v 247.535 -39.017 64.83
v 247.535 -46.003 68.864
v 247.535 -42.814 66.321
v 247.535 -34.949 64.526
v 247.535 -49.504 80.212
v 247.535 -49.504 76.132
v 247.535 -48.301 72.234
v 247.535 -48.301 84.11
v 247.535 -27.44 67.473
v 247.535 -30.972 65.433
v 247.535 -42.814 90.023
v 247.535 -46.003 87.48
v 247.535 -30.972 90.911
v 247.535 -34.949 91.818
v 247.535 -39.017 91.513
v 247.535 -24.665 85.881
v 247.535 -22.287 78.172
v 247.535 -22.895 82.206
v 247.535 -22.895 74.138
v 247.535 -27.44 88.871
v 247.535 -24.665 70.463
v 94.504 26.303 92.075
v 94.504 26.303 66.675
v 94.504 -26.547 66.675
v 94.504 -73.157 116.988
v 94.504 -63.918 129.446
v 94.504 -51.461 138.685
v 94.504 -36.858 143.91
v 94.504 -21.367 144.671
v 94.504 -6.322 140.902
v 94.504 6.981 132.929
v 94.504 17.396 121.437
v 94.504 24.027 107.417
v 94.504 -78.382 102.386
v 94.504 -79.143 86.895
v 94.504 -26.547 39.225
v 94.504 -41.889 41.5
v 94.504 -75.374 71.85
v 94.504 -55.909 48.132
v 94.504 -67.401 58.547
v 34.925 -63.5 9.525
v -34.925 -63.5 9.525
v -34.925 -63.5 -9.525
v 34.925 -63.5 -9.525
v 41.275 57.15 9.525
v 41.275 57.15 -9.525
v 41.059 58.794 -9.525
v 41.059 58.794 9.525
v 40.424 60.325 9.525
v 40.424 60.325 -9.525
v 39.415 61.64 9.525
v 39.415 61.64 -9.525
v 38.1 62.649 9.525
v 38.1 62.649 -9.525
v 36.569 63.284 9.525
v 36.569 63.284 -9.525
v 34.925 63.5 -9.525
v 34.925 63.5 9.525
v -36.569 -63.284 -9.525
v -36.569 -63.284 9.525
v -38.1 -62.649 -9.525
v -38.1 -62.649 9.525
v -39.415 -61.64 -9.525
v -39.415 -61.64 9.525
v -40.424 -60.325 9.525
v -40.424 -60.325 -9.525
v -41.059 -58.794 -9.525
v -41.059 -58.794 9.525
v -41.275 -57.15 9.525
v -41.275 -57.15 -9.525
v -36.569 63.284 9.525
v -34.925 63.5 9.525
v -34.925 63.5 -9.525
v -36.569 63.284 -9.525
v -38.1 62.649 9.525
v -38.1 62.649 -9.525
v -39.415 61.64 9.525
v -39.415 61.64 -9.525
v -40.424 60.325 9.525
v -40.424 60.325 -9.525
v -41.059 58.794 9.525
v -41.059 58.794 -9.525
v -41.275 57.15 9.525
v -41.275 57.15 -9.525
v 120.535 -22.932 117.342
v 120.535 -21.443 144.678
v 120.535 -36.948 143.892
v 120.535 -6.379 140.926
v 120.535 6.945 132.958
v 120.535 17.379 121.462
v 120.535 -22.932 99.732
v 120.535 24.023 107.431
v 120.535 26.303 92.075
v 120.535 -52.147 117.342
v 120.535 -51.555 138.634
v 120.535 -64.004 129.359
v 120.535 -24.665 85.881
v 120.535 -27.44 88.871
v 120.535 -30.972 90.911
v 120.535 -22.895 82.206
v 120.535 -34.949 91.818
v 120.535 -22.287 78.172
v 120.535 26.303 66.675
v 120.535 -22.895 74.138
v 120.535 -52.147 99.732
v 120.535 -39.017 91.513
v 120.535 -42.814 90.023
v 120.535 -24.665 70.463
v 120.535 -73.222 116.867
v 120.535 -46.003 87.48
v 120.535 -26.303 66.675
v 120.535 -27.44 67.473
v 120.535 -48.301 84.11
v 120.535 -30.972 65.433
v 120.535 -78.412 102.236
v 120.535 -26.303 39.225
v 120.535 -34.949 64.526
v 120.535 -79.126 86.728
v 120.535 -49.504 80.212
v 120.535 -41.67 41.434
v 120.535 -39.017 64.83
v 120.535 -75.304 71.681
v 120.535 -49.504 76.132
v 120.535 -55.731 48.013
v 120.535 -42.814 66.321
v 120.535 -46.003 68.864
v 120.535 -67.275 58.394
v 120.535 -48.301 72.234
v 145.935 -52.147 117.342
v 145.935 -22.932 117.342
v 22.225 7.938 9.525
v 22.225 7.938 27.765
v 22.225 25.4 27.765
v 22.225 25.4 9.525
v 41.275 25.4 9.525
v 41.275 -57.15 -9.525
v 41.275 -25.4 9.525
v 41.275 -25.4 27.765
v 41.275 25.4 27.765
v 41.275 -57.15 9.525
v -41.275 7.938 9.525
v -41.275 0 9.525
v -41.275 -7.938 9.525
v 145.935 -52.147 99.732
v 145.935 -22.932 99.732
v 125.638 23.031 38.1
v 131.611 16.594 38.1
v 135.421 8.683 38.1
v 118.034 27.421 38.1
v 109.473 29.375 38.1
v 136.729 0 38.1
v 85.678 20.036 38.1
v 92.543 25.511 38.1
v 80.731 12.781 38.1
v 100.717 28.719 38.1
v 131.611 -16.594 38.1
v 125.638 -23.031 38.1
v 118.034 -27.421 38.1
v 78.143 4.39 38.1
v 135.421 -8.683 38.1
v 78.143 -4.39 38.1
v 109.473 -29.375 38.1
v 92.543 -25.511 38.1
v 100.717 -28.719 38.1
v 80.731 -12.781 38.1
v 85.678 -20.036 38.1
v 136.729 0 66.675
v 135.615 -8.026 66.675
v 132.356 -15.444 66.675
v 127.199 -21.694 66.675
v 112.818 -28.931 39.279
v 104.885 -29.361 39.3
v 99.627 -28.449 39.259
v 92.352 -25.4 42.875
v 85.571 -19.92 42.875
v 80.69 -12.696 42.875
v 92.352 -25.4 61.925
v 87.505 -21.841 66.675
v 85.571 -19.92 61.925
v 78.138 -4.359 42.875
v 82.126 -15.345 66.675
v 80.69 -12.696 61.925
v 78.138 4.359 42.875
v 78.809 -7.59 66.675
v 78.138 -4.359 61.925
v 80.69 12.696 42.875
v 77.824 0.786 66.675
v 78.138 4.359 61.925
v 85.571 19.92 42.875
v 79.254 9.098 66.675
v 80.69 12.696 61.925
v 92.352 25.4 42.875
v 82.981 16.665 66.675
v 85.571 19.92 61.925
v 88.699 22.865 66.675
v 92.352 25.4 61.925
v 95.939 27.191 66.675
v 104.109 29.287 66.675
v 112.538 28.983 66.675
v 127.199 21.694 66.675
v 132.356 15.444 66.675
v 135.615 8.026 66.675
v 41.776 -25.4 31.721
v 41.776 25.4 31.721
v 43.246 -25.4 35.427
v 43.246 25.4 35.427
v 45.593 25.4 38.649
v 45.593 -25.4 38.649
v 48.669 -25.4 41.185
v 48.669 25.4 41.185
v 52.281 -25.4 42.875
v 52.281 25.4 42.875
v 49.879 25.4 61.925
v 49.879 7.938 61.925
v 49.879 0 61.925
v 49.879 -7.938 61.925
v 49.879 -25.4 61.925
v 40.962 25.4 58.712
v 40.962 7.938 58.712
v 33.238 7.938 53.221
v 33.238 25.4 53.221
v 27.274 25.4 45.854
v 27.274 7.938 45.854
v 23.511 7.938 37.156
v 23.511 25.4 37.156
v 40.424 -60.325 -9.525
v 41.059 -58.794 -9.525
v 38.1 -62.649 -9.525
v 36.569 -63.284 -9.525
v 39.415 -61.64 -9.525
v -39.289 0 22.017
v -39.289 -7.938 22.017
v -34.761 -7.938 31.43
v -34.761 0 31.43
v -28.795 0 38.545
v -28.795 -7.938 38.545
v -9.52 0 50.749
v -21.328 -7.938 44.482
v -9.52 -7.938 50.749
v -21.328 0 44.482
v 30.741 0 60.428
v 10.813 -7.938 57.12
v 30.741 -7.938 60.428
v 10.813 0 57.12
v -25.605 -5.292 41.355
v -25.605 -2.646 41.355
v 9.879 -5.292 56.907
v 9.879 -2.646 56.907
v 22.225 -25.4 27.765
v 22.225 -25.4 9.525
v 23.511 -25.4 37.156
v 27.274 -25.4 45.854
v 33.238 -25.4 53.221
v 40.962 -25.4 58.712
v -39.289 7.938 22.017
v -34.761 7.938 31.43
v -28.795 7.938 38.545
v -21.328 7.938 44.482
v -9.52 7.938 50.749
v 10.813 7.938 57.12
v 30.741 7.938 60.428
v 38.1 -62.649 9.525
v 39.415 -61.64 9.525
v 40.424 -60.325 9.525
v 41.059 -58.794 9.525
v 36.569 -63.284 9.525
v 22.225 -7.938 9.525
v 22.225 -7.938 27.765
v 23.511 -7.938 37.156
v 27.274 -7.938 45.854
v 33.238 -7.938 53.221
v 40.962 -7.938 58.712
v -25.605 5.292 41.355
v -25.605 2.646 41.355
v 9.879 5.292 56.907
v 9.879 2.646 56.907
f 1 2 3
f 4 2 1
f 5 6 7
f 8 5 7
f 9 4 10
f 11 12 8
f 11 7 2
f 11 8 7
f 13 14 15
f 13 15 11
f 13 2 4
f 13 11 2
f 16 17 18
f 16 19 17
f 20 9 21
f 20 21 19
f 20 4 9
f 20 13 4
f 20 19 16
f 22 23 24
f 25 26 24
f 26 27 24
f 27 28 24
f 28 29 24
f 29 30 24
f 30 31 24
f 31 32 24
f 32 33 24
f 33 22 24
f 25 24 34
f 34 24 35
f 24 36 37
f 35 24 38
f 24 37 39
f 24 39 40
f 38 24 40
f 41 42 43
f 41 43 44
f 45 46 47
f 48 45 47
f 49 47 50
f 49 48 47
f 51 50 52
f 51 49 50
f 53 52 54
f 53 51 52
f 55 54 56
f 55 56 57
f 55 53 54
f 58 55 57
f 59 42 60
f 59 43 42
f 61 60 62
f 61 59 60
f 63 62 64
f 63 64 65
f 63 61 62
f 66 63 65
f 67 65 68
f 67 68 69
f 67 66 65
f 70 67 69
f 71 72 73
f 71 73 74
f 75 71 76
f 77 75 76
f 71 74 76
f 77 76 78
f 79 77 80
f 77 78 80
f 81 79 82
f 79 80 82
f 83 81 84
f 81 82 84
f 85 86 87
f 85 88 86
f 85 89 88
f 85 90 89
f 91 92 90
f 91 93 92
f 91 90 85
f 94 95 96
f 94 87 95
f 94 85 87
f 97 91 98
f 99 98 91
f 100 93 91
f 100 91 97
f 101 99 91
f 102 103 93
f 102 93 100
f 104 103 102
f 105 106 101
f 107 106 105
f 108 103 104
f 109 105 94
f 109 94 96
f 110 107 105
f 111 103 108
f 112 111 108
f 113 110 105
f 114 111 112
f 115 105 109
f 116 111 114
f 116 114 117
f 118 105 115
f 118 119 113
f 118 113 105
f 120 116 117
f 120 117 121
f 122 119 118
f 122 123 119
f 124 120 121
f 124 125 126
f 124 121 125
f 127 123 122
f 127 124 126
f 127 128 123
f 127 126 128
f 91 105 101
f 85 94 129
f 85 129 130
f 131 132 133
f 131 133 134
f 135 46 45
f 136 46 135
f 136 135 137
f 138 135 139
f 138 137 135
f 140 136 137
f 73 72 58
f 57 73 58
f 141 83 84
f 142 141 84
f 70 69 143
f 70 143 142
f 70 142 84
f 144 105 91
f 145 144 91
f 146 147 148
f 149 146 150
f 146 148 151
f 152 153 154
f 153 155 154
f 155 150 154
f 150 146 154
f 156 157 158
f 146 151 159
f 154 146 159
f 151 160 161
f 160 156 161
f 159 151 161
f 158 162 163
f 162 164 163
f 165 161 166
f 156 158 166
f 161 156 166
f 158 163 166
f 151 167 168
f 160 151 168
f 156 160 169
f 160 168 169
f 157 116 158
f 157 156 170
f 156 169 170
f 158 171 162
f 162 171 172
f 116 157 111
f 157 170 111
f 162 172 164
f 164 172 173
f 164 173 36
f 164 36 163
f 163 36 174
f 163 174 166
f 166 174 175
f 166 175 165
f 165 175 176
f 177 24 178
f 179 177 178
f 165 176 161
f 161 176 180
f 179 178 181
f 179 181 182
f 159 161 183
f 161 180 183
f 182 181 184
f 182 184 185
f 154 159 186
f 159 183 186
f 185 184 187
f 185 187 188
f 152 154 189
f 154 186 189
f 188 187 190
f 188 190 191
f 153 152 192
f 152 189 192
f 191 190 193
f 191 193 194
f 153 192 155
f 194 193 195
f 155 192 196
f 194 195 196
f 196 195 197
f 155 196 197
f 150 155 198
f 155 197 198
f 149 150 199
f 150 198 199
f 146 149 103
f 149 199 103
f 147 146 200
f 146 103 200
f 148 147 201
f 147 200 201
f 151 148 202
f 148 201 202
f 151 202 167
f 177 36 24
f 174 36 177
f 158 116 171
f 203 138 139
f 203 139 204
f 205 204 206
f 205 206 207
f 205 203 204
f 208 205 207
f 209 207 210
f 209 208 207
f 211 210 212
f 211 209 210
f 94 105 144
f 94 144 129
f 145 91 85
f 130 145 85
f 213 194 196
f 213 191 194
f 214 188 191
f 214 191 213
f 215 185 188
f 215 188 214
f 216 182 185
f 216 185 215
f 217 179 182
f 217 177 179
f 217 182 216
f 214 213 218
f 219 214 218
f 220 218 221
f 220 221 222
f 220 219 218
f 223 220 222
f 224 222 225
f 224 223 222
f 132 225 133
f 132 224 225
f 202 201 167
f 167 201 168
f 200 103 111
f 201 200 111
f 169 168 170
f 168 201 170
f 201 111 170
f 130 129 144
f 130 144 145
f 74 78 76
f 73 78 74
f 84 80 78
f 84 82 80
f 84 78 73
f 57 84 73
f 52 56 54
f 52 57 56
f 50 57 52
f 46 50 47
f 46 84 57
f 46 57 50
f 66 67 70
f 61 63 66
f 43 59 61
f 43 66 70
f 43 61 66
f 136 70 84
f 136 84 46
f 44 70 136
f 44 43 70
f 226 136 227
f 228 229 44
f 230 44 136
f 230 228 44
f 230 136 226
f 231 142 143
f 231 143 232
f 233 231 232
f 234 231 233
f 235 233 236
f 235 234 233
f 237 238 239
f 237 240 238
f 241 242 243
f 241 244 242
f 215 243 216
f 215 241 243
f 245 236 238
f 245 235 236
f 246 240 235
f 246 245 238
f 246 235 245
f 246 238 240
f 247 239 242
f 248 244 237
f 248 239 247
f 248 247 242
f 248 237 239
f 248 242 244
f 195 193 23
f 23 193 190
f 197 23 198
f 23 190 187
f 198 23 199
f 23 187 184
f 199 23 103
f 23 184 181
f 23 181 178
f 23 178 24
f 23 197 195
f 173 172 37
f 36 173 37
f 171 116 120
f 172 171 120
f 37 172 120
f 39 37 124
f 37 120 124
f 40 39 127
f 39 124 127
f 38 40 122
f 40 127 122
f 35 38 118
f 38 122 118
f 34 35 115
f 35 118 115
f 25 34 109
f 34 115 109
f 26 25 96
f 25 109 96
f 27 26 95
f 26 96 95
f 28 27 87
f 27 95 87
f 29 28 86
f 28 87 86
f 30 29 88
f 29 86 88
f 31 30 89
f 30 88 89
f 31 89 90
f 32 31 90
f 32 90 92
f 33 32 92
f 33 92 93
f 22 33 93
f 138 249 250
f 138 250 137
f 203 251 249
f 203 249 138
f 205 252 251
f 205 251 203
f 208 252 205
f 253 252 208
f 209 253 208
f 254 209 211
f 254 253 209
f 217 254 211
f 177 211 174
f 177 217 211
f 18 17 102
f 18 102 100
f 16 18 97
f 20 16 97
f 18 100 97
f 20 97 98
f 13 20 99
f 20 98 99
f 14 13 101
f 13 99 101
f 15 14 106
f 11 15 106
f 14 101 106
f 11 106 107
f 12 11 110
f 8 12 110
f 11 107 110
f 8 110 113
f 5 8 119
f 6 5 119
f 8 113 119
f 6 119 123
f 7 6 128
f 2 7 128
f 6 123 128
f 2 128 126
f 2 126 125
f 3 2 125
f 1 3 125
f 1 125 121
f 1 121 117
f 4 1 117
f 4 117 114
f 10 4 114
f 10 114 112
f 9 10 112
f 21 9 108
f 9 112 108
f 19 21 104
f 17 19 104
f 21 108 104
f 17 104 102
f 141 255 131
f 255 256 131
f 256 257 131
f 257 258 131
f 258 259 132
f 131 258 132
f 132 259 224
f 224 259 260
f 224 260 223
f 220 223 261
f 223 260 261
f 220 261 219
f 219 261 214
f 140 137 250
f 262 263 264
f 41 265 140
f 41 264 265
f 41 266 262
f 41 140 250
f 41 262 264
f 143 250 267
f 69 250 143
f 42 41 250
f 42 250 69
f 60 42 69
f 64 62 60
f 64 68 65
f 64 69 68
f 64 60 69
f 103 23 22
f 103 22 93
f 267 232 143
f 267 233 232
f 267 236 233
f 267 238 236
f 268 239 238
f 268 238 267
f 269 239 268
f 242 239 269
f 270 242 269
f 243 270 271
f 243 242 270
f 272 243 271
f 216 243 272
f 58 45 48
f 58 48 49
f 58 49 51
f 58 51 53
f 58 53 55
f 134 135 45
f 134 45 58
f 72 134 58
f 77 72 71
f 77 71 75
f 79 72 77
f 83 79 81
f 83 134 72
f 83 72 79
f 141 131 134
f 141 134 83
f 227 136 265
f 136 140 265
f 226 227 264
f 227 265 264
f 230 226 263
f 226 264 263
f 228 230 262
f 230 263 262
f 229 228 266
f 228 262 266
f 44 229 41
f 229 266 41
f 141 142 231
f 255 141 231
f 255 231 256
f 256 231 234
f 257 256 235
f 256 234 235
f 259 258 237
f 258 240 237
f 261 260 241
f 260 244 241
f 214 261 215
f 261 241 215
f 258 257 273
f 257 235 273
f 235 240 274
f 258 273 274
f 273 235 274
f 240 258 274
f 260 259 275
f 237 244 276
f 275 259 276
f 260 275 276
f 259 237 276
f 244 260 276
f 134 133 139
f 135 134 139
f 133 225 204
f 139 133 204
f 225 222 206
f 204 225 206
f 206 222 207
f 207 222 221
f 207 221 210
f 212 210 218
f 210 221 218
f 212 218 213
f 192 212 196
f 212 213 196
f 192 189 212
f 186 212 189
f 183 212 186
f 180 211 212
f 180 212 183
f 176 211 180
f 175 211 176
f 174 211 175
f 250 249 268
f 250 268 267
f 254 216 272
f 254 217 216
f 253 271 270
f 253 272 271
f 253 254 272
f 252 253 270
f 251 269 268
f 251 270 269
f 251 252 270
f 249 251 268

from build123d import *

# Parameters (mm, degrees)
F1_DEPTH  = 63.5
F0_W      = 21.3422756978
F0_H      = 19.05
F2_DEPTH  = 25.4
F3_DEPTH  = 7.9375
F5_R      = 6.35
F6_W      = 26.030293598
F6_H      = 52.8502463959
F7_DEPTH  = 25.4
F7_FACE_W = 26.030293598
F7_FACE_H = 52.8502463959
F9_W      = 29.2156040668
F9_H      = 17.6097750664
F10_DEPTH = 25.4
F12_R     = 13.6846052914
F13_DEPTH = 127


with BuildPart() as f1:
    # F0 (on Front) → F1 (new body, symmetric)
    with BuildSketch(Plane.XZ):
        Polygon((41.275, -9.525), (41.275, 9.525), (22.225, 9.525), (-41.275, 9.525), (-41.275, -9.525), align=None)
    extrude(amount=F1_DEPTH, both=True)

    # F0 (on Front) → F2 (join, symmetric)
    with BuildSketch(Plane.XZ):
        with BuildLine():
            Line((22.225, 9.525), (41.275, 9.525))
            Line((41.275, 9.525), (41.275, 27.7654680662))
            ThreePointArc((41.275, 27.7654680662), (44.31804227, 37.1119372292), (52.28054152, 42.8752))
            Line((52.28054152, 42.8752), (85.9294086695, 42.8752))
            Line((85.9294086695, 42.8752), (85.9294086695, 61.9252))
            Line((85.9294086695, 61.9252), (49.8789382336, 61.9252))
            ThreePointArc((49.8789382336, 61.9252), (30.0050422989, 49.7406107598), (22.225, 27.7654680662))
            Line((22.225, 27.7654680662), (22.225, 9.525))
        make_face()
        with Locations((96.6005465184, 52.4002)):
            Rectangle(F0_W, F0_H)
    extrude(amount=F2_DEPTH, both=True)

    # F0 (on Front) → F3 (join, symmetric)
    with BuildSketch(Plane.XZ):
        with BuildLine():
            Line((-41.275, 9.525), (22.225, 9.525))
            Line((22.225, 9.525), (22.225, 27.7654680662))
            ThreePointArc((22.225, 27.7654680662), (30.0050422989, 49.7406107598), (49.8789382336, 61.9252))
            add(Edge.make_bspline(
                [(-41.275, 9.525), (-40.6103878044, 51.4096161185), (12.72025149, 60.2582759139), (49.8789382336, 61.9252)],
                knots=[0, 0, 0, 0, 105.1419108421, 105.1419108421, 105.1419108421, 105.1419108421], degree=3))
        make_face()
    extrude(amount=F3_DEPTH, both=True)

    # F0 (on Front) → F4 (revolve)
    with BuildSketch(Plane.XZ):
        Polygon((107.2716843673, 61.9252), (107.2716843673, 42.8752), (107.2716843673, 38.1), (136.7294086695, 38.1), (136.7294086695, 66.675), (107.2716843673, 66.675), align=None)
    revolve(axis=Axis((107.2716843673, 0, 52.3875), (0, 0, -1)))

    # F5
    f5_edges = [f1.edges().sort_by_distance(p)[0] for p in [
        (41.275, -63.5, 0),
        (41.275, 63.5, 0),
        (-41.275, 63.5, 0),
        (-41.275, -63.5, 0),
    ]]
    fillet(f5_edges, radius=F5_R)

    # F6 (on face) → F7 (join)
    with BuildSketch(Plane.XY.offset(66.675)):
        with Locations((107.5195462284, -0.1220792231)):
            Rectangle(F6_W, F6_H)
    extrude(amount=F7_DEPTH)

    # F7_face (on face) → F8 (revolve)
    with BuildSketch(Plane(origin=(107.5195462284, -0.1220792231, 92.075), x_dir=(1, 0, 0), z_dir=(0, 0, 1))):
        Rectangle(F7_FACE_W, F7_FACE_H)
    revolve(axis=Axis((107.5195462284, -26.547202421, 92.075), (-1, 0, 0)))

    # F9 (on face) → F10 (join)
    with BuildSketch(Plane.YZ.offset(120.5346930274)):
        with Locations((-37.5394821167, 108.5370406508)):
            Rectangle(F9_W, F9_H)
    extrude(amount=F10_DEPTH)

    # F12 (on face) → F13 (join)
    with BuildSketch(Plane.YZ.offset(120.5346930274)):
        with Locations((-35.9719246626, 78.1719759107)):
            Circle(F12_R)
    extrude(amount=F13_DEPTH)


solid = f1.part
